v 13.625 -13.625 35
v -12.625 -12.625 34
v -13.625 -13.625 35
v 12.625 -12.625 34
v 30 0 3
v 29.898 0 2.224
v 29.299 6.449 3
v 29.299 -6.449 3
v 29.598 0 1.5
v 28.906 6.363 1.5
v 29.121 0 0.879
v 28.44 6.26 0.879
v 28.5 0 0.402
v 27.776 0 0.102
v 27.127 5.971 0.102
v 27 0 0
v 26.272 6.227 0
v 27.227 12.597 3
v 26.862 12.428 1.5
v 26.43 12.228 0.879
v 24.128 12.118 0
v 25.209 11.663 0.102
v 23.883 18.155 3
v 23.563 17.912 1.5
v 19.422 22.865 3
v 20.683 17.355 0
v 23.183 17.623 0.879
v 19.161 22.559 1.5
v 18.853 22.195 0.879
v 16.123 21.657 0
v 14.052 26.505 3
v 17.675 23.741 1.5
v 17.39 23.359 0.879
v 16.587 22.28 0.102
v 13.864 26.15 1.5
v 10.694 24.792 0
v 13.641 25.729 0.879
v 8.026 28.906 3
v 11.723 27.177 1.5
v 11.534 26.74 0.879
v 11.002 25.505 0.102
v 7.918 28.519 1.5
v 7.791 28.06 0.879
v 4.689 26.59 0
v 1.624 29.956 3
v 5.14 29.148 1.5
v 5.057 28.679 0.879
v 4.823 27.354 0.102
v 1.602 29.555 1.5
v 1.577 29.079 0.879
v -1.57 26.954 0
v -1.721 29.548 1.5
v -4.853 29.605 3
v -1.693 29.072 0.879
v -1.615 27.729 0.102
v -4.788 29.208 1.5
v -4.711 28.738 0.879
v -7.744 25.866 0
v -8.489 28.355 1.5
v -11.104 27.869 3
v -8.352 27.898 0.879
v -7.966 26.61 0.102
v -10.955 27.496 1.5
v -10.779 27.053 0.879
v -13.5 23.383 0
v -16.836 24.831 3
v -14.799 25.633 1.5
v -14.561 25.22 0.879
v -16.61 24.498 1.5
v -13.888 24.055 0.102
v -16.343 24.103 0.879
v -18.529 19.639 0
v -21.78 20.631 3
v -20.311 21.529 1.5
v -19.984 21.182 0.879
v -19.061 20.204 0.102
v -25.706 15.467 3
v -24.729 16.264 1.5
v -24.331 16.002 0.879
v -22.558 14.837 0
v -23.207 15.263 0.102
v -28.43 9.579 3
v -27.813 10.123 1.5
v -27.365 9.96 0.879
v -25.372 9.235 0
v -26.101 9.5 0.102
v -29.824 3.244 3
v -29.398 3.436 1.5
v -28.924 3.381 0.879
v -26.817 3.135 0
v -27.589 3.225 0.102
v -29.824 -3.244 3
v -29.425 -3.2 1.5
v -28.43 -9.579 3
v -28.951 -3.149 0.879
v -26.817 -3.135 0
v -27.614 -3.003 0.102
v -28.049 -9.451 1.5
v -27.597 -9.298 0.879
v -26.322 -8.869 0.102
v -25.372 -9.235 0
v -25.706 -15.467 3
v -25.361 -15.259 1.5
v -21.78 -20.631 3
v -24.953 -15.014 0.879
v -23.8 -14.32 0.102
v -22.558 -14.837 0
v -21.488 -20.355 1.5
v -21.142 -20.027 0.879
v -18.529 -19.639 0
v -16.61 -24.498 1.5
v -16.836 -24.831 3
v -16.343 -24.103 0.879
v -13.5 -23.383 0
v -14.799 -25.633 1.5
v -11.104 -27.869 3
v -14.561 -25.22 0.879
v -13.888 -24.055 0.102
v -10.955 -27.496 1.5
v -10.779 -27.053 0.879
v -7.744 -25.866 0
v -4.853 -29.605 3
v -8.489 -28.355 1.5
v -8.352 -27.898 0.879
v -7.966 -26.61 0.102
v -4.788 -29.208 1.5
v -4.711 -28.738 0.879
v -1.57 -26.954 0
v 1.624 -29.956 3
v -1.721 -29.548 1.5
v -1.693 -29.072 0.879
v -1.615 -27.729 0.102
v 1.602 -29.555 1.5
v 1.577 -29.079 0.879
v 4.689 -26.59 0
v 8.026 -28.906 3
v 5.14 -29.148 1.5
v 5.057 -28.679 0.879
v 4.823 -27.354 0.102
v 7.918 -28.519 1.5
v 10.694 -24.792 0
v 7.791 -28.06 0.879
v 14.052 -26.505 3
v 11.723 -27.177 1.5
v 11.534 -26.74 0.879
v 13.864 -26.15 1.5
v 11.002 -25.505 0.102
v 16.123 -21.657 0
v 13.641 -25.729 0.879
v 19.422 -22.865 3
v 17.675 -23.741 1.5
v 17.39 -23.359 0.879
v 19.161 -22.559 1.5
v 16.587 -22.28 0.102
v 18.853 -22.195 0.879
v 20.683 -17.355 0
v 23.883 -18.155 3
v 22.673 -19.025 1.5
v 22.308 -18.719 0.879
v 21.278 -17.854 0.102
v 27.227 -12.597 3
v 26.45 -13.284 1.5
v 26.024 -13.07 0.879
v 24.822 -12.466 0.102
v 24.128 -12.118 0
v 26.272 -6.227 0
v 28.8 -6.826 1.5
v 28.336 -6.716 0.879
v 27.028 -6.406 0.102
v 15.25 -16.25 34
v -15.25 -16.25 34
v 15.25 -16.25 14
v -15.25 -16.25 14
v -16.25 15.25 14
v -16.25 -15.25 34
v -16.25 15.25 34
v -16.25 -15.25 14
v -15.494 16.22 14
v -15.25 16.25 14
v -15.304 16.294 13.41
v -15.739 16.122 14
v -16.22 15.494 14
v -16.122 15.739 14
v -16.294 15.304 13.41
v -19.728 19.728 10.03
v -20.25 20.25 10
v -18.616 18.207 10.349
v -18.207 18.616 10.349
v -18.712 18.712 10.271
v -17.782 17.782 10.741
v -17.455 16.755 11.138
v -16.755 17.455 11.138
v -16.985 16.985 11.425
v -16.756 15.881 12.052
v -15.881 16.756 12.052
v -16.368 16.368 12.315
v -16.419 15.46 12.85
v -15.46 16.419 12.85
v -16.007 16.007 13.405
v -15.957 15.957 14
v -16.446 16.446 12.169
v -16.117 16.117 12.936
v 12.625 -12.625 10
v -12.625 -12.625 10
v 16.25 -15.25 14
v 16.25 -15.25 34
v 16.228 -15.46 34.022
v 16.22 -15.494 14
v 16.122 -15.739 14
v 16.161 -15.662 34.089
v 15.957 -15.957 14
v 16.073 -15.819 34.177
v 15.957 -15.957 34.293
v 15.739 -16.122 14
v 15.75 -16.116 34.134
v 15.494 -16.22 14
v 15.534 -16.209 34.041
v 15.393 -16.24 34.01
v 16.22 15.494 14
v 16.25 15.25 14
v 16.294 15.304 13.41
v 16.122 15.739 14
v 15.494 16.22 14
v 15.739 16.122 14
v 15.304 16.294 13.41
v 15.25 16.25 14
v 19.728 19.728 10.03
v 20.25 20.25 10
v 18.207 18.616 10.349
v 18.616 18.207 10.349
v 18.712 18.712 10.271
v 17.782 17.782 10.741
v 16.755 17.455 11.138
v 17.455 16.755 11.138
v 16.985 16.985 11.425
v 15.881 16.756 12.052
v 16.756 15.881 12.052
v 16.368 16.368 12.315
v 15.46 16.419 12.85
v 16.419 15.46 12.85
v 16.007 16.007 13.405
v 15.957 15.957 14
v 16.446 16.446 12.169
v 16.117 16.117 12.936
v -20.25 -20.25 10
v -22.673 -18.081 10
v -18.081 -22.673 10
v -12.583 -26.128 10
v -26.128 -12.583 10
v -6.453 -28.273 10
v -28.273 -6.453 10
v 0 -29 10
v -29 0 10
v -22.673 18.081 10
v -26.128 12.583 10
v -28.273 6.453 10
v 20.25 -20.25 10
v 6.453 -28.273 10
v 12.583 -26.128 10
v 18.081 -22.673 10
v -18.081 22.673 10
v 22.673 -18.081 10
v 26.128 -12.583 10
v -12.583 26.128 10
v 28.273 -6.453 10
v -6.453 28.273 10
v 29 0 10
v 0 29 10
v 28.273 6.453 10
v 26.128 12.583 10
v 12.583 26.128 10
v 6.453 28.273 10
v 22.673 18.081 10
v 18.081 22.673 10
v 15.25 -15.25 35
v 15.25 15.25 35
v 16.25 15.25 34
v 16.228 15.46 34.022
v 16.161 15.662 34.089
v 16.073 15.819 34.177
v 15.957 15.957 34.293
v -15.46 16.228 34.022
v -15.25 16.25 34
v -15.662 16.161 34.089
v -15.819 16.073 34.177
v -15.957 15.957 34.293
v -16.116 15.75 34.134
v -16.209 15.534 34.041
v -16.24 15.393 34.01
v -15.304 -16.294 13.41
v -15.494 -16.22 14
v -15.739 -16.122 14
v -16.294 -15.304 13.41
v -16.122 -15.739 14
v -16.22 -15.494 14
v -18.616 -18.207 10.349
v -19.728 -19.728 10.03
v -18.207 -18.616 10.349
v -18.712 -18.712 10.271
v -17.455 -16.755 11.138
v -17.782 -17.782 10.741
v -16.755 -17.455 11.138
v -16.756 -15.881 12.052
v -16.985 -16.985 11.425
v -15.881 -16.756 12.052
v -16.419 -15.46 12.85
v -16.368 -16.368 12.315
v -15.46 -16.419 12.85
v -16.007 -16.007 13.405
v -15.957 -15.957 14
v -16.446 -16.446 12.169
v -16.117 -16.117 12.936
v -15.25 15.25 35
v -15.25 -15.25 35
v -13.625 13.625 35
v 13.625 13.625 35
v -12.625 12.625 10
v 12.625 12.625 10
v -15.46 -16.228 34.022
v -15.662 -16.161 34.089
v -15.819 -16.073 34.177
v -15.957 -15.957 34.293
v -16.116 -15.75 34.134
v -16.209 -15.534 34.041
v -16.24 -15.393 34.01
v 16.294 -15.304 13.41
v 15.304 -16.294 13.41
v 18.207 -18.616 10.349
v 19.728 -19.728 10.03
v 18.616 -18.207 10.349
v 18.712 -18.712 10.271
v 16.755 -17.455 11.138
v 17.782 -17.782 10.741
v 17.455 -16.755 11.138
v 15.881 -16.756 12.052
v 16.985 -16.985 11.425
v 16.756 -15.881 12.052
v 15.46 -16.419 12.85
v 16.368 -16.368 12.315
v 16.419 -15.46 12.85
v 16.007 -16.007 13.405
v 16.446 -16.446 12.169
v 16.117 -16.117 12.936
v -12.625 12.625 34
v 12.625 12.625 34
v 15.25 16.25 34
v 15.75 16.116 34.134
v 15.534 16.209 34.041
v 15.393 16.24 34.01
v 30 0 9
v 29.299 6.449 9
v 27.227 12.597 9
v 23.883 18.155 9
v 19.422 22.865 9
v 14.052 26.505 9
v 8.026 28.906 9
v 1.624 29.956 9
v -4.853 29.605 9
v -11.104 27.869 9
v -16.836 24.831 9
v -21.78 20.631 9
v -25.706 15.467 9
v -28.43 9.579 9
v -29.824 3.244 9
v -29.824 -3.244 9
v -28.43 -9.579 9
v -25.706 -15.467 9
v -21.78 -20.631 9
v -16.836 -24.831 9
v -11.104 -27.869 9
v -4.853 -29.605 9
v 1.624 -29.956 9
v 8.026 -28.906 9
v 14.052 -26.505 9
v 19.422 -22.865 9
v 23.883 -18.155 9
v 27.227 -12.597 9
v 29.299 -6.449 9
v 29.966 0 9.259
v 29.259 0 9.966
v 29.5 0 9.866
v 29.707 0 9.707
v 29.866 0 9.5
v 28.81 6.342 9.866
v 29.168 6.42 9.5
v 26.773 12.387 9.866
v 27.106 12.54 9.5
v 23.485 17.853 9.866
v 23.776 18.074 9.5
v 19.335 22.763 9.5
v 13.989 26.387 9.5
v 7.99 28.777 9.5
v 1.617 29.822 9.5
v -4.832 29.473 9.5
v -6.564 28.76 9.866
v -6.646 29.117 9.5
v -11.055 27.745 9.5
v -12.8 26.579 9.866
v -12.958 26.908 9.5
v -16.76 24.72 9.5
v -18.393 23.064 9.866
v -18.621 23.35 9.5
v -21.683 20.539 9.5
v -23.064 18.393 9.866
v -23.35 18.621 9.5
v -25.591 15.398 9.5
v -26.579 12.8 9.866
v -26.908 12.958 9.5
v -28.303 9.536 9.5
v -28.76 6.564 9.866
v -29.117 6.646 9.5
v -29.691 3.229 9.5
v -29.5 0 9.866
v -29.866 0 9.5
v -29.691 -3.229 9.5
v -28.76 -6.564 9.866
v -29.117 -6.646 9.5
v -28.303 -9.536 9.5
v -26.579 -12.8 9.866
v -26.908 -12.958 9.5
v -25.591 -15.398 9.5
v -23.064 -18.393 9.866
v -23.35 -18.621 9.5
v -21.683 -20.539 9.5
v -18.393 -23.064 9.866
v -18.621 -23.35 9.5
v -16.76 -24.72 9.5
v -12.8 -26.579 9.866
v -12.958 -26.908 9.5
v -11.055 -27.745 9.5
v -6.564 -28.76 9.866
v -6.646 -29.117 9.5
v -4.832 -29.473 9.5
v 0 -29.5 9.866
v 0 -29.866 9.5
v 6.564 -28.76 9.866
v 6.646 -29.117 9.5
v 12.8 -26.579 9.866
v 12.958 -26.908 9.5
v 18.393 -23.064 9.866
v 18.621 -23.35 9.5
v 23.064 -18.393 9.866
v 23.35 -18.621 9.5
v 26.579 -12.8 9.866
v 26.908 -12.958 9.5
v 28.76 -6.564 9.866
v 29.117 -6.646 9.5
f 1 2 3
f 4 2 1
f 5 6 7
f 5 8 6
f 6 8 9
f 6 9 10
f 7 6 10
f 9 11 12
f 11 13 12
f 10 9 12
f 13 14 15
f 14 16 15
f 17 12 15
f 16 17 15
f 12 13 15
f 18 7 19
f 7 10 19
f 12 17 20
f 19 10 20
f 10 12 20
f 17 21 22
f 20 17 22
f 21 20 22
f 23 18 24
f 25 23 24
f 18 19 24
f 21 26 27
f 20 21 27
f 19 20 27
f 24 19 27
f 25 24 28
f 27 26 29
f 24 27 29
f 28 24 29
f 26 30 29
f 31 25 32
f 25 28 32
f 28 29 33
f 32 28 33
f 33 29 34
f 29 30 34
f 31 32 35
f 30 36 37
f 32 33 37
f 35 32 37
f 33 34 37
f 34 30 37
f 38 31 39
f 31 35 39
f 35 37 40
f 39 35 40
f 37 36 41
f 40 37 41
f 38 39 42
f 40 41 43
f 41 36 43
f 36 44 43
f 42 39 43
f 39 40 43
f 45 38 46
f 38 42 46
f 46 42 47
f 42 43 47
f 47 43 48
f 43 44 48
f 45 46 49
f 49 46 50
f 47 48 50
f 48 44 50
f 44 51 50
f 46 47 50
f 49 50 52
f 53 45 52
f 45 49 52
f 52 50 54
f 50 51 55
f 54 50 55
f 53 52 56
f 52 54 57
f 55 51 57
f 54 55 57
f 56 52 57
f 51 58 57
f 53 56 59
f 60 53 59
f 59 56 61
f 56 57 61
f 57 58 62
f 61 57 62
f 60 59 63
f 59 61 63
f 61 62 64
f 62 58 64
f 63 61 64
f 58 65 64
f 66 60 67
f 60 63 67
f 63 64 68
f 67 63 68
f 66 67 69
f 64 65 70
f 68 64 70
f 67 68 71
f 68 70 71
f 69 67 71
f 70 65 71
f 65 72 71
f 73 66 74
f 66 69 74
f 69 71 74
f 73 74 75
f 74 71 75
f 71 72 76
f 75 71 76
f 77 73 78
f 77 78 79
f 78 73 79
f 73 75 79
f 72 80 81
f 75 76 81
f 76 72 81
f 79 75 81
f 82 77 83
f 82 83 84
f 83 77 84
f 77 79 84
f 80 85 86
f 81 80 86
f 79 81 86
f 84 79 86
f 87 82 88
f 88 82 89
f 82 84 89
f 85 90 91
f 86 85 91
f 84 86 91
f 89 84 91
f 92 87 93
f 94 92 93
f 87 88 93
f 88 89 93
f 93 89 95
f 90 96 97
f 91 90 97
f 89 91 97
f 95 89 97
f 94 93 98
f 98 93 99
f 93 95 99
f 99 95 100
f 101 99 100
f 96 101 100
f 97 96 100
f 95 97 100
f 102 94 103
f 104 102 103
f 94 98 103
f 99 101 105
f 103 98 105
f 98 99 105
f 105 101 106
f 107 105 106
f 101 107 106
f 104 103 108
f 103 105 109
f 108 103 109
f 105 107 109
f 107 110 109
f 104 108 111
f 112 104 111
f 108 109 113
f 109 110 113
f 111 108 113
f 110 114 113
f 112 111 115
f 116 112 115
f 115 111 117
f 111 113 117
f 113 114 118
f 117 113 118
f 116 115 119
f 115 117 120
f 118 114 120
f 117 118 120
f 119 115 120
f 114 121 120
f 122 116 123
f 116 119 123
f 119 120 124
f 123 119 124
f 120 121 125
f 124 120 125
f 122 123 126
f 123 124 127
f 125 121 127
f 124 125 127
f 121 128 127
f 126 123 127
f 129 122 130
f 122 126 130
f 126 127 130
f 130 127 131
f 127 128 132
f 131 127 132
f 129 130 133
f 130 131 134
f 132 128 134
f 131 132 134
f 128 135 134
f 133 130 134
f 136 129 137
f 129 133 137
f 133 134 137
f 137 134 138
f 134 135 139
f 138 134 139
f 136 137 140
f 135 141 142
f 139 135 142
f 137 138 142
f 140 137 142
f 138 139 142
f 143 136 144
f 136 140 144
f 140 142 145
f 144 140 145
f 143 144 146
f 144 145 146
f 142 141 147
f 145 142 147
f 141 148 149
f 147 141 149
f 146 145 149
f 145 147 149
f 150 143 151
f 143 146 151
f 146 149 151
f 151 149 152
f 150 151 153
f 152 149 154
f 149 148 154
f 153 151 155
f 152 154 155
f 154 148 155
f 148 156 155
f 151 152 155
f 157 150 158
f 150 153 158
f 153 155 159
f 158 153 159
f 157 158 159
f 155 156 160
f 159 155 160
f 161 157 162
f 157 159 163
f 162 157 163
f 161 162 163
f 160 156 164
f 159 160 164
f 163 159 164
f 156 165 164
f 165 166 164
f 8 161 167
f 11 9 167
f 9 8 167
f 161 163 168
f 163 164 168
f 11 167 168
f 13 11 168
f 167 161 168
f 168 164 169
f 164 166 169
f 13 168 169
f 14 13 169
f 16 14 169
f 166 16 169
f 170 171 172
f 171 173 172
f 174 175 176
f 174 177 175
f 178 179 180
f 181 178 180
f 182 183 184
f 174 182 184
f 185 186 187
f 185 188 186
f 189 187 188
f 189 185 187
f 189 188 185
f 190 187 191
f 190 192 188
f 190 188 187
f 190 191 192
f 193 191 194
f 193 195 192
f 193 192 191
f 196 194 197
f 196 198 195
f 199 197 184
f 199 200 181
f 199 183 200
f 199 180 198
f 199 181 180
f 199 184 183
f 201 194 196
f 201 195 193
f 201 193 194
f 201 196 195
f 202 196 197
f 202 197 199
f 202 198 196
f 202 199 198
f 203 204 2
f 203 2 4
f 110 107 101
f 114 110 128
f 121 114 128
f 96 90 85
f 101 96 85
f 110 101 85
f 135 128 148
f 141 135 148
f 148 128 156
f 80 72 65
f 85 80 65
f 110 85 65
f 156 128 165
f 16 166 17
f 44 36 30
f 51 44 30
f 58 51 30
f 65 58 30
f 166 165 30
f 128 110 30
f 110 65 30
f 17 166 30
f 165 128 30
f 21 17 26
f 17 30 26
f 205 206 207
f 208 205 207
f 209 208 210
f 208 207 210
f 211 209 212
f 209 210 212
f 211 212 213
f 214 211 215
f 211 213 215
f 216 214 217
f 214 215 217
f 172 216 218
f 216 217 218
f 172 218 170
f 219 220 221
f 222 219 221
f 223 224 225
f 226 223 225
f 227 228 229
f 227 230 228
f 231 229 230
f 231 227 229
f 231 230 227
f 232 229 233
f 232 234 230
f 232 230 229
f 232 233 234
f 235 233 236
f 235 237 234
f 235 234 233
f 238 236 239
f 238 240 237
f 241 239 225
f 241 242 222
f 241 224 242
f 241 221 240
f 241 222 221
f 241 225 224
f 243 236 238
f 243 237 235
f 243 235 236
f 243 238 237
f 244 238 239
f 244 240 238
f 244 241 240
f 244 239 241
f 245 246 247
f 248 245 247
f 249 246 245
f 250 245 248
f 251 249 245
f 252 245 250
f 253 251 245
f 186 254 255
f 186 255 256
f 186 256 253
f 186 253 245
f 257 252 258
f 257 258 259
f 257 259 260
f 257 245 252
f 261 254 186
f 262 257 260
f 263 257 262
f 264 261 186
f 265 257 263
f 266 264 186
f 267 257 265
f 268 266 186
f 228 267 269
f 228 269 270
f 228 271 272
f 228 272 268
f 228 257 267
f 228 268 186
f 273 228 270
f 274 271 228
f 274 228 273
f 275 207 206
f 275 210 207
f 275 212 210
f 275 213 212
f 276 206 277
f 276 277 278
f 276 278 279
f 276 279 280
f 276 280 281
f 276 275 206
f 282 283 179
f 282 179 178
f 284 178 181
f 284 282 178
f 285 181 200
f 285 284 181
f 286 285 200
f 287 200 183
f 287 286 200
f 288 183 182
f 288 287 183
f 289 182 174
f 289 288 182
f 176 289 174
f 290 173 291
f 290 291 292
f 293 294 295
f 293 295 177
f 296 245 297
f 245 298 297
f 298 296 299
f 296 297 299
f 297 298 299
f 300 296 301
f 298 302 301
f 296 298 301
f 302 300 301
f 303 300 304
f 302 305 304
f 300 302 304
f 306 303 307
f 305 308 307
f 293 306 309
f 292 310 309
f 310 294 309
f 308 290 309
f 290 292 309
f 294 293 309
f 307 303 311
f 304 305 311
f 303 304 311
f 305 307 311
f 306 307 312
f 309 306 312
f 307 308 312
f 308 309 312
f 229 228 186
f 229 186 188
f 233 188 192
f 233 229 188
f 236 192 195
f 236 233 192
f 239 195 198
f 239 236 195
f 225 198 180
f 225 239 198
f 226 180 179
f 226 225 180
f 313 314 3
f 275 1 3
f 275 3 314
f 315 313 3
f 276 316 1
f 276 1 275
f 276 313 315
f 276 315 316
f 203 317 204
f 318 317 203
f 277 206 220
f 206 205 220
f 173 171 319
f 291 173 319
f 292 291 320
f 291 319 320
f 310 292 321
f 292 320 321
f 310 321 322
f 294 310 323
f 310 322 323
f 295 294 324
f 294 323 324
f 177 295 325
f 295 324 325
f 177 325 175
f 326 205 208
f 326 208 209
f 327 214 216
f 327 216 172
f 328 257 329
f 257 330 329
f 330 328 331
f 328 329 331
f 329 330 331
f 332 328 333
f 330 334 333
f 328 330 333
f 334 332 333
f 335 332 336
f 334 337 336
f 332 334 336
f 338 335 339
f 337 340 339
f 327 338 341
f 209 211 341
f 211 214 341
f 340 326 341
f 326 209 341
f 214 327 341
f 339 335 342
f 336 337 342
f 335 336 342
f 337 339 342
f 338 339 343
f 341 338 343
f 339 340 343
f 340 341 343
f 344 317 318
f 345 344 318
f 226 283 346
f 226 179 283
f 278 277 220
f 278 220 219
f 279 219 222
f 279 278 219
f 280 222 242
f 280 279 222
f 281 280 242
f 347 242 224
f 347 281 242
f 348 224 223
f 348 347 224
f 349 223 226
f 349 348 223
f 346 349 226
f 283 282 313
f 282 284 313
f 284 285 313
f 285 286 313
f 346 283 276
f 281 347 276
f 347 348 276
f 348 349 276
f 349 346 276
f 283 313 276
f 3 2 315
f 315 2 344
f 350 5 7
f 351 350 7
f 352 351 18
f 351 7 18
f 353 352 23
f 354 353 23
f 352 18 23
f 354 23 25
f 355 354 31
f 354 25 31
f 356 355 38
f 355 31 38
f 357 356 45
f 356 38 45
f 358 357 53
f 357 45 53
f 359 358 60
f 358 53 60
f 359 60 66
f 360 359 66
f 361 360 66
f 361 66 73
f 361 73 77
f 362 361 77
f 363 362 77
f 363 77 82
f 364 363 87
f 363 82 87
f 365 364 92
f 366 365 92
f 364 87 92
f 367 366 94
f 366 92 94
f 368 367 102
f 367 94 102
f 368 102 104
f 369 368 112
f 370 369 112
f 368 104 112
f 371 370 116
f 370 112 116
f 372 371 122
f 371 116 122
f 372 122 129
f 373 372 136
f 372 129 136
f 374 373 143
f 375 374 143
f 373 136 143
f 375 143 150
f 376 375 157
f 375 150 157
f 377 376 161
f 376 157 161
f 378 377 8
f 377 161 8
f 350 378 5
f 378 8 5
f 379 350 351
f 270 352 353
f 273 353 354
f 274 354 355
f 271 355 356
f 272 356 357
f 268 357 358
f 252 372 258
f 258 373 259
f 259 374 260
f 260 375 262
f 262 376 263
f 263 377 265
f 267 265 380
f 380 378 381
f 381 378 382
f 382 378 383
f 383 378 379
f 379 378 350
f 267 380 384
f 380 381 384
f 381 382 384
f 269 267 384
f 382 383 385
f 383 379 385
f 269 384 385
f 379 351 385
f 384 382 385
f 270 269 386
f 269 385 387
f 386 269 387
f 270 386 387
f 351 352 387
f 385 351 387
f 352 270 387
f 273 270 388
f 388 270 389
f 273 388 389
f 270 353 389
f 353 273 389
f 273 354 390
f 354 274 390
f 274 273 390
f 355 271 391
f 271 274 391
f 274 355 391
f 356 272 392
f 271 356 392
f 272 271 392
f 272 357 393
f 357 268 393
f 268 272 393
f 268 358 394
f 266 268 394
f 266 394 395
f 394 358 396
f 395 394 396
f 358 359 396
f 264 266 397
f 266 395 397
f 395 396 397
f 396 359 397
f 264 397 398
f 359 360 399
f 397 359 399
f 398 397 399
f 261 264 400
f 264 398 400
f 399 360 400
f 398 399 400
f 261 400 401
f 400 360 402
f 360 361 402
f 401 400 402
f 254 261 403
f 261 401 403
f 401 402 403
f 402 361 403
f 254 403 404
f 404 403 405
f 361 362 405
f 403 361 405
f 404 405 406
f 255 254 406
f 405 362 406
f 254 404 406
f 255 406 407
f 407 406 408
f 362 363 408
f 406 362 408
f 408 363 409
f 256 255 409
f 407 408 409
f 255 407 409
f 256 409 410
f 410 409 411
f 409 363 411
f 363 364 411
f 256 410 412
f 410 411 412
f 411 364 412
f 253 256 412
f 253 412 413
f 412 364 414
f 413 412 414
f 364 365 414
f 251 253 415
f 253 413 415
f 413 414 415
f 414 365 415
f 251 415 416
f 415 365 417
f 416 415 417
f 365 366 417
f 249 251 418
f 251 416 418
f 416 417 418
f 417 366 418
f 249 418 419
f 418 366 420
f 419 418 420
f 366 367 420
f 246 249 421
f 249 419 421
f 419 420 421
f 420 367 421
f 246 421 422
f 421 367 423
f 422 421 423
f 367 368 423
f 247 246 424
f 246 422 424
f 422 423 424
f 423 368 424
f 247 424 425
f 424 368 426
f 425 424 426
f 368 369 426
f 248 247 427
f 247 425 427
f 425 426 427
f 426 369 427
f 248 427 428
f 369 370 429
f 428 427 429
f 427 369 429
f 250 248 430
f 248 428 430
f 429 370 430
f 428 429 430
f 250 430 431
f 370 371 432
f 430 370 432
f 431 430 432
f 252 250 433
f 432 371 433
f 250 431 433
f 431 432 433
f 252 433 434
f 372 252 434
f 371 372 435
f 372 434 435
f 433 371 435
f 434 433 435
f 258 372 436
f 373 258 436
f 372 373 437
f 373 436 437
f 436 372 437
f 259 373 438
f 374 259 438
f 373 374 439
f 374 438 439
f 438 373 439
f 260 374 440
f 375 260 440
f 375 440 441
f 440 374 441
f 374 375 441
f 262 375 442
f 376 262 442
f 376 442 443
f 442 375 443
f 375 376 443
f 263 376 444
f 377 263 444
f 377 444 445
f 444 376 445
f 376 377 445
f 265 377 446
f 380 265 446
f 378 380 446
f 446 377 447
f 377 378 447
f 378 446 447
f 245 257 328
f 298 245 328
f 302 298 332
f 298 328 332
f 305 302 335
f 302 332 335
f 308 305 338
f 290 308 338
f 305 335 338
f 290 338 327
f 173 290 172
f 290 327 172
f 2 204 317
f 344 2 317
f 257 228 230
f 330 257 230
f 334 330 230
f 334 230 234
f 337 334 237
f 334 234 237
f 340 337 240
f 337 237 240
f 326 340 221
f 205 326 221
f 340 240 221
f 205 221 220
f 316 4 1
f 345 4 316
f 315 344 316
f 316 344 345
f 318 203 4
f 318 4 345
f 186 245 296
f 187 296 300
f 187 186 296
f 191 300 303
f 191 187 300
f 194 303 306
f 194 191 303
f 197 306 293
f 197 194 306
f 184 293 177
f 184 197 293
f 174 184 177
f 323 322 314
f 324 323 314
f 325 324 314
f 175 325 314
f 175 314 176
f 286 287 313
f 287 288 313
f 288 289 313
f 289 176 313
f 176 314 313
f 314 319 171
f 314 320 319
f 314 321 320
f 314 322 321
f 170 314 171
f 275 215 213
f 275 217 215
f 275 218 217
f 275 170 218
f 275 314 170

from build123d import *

# Parameters (mm, degrees)
SKETCH_R      = 30
PAD_DEPTH     = 10
SKETCH001_W   = 32.5
SKETCH001_H   = 32.5
SKETCH001_W_2 = 25.25
SKETCH001_H_2 = 25.25
PAD001_DEPTH  = 25
FILLET_R      = 4
FILLET001_R   = 1
FILLET002_R   = 3
CHAMFER_SIZE  = 1
FILLET003_R   = 1
FILLET004_R   = 1


with BuildPart() as part:
    # Sketch → Pad (new body)
    with BuildSketch(Plane.XY):
        Circle(SKETCH_R)
    extrude(amount=PAD_DEPTH)

    # Sketch001 (on Face3 of Pad) → Pad001 (join)
    with BuildSketch(Plane.XY.offset(10)):
        Rectangle(SKETCH001_W, SKETCH001_H)
        Rectangle(SKETCH001_W_2, SKETCH001_H_2, mode=Mode.SUBTRACT)
    extrude(amount=PAD001_DEPTH)

    # Fillet
    fillet_edges = [part.edges().sort_by_distance(p)[0] for p in [
        (16.25, 0, 10),
        (0, -16.25, 10),
        (-16.25, 0, 10),
        (0, 16.25, 10),
    ]]
    fillet(fillet_edges, radius=FILLET_R)

    # Fillet001
    fillet001_edges = [part.edges().sort_by_distance(p)[0] for p in [
        (-30, 0, 10),
    ]]
    fillet(fillet001_edges, radius=FILLET001_R)

    # Fillet002
    fillet002_edges = [part.edges().sort_by_distance(p)[0] for p in [
        (-30, 0, 0),
    ]]
    fillet(fillet002_edges, radius=FILLET002_R)

    # Chamfer
    chamfer_edges = [part.edges().sort_by_distance(p)[0] for p in [
        (-16.25, 0, 35),
        (0, -16.25, 35),
        (16.25, 0, 35),
        (0, 16.25, 35),
        (-12.625, 0, 35),
        (0, -12.625, 35),
        (12.625, 0, 35),
        (0, 12.625, 35),
    ]]
    chamfer(chamfer_edges, length=CHAMFER_SIZE)

    # Fillet003
    fillet003_edges = [part.edges().sort_by_distance(p)[0] for p in [
        (16.25, -16.25, 24),
        (-16.25, -16.25, 24),
        (-16.25, 16.25, 24),
    ]]
    fillet(fillet003_edges, radius=FILLET003_R)

    # Fillet004
    fillet004_edges = [part.edges().sort_by_distance(p)[0] for p in [
        (16.25, 16.25, 24),
    ]]
    fillet(fillet004_edges, radius=FILLET004_R)


solid = part.part
